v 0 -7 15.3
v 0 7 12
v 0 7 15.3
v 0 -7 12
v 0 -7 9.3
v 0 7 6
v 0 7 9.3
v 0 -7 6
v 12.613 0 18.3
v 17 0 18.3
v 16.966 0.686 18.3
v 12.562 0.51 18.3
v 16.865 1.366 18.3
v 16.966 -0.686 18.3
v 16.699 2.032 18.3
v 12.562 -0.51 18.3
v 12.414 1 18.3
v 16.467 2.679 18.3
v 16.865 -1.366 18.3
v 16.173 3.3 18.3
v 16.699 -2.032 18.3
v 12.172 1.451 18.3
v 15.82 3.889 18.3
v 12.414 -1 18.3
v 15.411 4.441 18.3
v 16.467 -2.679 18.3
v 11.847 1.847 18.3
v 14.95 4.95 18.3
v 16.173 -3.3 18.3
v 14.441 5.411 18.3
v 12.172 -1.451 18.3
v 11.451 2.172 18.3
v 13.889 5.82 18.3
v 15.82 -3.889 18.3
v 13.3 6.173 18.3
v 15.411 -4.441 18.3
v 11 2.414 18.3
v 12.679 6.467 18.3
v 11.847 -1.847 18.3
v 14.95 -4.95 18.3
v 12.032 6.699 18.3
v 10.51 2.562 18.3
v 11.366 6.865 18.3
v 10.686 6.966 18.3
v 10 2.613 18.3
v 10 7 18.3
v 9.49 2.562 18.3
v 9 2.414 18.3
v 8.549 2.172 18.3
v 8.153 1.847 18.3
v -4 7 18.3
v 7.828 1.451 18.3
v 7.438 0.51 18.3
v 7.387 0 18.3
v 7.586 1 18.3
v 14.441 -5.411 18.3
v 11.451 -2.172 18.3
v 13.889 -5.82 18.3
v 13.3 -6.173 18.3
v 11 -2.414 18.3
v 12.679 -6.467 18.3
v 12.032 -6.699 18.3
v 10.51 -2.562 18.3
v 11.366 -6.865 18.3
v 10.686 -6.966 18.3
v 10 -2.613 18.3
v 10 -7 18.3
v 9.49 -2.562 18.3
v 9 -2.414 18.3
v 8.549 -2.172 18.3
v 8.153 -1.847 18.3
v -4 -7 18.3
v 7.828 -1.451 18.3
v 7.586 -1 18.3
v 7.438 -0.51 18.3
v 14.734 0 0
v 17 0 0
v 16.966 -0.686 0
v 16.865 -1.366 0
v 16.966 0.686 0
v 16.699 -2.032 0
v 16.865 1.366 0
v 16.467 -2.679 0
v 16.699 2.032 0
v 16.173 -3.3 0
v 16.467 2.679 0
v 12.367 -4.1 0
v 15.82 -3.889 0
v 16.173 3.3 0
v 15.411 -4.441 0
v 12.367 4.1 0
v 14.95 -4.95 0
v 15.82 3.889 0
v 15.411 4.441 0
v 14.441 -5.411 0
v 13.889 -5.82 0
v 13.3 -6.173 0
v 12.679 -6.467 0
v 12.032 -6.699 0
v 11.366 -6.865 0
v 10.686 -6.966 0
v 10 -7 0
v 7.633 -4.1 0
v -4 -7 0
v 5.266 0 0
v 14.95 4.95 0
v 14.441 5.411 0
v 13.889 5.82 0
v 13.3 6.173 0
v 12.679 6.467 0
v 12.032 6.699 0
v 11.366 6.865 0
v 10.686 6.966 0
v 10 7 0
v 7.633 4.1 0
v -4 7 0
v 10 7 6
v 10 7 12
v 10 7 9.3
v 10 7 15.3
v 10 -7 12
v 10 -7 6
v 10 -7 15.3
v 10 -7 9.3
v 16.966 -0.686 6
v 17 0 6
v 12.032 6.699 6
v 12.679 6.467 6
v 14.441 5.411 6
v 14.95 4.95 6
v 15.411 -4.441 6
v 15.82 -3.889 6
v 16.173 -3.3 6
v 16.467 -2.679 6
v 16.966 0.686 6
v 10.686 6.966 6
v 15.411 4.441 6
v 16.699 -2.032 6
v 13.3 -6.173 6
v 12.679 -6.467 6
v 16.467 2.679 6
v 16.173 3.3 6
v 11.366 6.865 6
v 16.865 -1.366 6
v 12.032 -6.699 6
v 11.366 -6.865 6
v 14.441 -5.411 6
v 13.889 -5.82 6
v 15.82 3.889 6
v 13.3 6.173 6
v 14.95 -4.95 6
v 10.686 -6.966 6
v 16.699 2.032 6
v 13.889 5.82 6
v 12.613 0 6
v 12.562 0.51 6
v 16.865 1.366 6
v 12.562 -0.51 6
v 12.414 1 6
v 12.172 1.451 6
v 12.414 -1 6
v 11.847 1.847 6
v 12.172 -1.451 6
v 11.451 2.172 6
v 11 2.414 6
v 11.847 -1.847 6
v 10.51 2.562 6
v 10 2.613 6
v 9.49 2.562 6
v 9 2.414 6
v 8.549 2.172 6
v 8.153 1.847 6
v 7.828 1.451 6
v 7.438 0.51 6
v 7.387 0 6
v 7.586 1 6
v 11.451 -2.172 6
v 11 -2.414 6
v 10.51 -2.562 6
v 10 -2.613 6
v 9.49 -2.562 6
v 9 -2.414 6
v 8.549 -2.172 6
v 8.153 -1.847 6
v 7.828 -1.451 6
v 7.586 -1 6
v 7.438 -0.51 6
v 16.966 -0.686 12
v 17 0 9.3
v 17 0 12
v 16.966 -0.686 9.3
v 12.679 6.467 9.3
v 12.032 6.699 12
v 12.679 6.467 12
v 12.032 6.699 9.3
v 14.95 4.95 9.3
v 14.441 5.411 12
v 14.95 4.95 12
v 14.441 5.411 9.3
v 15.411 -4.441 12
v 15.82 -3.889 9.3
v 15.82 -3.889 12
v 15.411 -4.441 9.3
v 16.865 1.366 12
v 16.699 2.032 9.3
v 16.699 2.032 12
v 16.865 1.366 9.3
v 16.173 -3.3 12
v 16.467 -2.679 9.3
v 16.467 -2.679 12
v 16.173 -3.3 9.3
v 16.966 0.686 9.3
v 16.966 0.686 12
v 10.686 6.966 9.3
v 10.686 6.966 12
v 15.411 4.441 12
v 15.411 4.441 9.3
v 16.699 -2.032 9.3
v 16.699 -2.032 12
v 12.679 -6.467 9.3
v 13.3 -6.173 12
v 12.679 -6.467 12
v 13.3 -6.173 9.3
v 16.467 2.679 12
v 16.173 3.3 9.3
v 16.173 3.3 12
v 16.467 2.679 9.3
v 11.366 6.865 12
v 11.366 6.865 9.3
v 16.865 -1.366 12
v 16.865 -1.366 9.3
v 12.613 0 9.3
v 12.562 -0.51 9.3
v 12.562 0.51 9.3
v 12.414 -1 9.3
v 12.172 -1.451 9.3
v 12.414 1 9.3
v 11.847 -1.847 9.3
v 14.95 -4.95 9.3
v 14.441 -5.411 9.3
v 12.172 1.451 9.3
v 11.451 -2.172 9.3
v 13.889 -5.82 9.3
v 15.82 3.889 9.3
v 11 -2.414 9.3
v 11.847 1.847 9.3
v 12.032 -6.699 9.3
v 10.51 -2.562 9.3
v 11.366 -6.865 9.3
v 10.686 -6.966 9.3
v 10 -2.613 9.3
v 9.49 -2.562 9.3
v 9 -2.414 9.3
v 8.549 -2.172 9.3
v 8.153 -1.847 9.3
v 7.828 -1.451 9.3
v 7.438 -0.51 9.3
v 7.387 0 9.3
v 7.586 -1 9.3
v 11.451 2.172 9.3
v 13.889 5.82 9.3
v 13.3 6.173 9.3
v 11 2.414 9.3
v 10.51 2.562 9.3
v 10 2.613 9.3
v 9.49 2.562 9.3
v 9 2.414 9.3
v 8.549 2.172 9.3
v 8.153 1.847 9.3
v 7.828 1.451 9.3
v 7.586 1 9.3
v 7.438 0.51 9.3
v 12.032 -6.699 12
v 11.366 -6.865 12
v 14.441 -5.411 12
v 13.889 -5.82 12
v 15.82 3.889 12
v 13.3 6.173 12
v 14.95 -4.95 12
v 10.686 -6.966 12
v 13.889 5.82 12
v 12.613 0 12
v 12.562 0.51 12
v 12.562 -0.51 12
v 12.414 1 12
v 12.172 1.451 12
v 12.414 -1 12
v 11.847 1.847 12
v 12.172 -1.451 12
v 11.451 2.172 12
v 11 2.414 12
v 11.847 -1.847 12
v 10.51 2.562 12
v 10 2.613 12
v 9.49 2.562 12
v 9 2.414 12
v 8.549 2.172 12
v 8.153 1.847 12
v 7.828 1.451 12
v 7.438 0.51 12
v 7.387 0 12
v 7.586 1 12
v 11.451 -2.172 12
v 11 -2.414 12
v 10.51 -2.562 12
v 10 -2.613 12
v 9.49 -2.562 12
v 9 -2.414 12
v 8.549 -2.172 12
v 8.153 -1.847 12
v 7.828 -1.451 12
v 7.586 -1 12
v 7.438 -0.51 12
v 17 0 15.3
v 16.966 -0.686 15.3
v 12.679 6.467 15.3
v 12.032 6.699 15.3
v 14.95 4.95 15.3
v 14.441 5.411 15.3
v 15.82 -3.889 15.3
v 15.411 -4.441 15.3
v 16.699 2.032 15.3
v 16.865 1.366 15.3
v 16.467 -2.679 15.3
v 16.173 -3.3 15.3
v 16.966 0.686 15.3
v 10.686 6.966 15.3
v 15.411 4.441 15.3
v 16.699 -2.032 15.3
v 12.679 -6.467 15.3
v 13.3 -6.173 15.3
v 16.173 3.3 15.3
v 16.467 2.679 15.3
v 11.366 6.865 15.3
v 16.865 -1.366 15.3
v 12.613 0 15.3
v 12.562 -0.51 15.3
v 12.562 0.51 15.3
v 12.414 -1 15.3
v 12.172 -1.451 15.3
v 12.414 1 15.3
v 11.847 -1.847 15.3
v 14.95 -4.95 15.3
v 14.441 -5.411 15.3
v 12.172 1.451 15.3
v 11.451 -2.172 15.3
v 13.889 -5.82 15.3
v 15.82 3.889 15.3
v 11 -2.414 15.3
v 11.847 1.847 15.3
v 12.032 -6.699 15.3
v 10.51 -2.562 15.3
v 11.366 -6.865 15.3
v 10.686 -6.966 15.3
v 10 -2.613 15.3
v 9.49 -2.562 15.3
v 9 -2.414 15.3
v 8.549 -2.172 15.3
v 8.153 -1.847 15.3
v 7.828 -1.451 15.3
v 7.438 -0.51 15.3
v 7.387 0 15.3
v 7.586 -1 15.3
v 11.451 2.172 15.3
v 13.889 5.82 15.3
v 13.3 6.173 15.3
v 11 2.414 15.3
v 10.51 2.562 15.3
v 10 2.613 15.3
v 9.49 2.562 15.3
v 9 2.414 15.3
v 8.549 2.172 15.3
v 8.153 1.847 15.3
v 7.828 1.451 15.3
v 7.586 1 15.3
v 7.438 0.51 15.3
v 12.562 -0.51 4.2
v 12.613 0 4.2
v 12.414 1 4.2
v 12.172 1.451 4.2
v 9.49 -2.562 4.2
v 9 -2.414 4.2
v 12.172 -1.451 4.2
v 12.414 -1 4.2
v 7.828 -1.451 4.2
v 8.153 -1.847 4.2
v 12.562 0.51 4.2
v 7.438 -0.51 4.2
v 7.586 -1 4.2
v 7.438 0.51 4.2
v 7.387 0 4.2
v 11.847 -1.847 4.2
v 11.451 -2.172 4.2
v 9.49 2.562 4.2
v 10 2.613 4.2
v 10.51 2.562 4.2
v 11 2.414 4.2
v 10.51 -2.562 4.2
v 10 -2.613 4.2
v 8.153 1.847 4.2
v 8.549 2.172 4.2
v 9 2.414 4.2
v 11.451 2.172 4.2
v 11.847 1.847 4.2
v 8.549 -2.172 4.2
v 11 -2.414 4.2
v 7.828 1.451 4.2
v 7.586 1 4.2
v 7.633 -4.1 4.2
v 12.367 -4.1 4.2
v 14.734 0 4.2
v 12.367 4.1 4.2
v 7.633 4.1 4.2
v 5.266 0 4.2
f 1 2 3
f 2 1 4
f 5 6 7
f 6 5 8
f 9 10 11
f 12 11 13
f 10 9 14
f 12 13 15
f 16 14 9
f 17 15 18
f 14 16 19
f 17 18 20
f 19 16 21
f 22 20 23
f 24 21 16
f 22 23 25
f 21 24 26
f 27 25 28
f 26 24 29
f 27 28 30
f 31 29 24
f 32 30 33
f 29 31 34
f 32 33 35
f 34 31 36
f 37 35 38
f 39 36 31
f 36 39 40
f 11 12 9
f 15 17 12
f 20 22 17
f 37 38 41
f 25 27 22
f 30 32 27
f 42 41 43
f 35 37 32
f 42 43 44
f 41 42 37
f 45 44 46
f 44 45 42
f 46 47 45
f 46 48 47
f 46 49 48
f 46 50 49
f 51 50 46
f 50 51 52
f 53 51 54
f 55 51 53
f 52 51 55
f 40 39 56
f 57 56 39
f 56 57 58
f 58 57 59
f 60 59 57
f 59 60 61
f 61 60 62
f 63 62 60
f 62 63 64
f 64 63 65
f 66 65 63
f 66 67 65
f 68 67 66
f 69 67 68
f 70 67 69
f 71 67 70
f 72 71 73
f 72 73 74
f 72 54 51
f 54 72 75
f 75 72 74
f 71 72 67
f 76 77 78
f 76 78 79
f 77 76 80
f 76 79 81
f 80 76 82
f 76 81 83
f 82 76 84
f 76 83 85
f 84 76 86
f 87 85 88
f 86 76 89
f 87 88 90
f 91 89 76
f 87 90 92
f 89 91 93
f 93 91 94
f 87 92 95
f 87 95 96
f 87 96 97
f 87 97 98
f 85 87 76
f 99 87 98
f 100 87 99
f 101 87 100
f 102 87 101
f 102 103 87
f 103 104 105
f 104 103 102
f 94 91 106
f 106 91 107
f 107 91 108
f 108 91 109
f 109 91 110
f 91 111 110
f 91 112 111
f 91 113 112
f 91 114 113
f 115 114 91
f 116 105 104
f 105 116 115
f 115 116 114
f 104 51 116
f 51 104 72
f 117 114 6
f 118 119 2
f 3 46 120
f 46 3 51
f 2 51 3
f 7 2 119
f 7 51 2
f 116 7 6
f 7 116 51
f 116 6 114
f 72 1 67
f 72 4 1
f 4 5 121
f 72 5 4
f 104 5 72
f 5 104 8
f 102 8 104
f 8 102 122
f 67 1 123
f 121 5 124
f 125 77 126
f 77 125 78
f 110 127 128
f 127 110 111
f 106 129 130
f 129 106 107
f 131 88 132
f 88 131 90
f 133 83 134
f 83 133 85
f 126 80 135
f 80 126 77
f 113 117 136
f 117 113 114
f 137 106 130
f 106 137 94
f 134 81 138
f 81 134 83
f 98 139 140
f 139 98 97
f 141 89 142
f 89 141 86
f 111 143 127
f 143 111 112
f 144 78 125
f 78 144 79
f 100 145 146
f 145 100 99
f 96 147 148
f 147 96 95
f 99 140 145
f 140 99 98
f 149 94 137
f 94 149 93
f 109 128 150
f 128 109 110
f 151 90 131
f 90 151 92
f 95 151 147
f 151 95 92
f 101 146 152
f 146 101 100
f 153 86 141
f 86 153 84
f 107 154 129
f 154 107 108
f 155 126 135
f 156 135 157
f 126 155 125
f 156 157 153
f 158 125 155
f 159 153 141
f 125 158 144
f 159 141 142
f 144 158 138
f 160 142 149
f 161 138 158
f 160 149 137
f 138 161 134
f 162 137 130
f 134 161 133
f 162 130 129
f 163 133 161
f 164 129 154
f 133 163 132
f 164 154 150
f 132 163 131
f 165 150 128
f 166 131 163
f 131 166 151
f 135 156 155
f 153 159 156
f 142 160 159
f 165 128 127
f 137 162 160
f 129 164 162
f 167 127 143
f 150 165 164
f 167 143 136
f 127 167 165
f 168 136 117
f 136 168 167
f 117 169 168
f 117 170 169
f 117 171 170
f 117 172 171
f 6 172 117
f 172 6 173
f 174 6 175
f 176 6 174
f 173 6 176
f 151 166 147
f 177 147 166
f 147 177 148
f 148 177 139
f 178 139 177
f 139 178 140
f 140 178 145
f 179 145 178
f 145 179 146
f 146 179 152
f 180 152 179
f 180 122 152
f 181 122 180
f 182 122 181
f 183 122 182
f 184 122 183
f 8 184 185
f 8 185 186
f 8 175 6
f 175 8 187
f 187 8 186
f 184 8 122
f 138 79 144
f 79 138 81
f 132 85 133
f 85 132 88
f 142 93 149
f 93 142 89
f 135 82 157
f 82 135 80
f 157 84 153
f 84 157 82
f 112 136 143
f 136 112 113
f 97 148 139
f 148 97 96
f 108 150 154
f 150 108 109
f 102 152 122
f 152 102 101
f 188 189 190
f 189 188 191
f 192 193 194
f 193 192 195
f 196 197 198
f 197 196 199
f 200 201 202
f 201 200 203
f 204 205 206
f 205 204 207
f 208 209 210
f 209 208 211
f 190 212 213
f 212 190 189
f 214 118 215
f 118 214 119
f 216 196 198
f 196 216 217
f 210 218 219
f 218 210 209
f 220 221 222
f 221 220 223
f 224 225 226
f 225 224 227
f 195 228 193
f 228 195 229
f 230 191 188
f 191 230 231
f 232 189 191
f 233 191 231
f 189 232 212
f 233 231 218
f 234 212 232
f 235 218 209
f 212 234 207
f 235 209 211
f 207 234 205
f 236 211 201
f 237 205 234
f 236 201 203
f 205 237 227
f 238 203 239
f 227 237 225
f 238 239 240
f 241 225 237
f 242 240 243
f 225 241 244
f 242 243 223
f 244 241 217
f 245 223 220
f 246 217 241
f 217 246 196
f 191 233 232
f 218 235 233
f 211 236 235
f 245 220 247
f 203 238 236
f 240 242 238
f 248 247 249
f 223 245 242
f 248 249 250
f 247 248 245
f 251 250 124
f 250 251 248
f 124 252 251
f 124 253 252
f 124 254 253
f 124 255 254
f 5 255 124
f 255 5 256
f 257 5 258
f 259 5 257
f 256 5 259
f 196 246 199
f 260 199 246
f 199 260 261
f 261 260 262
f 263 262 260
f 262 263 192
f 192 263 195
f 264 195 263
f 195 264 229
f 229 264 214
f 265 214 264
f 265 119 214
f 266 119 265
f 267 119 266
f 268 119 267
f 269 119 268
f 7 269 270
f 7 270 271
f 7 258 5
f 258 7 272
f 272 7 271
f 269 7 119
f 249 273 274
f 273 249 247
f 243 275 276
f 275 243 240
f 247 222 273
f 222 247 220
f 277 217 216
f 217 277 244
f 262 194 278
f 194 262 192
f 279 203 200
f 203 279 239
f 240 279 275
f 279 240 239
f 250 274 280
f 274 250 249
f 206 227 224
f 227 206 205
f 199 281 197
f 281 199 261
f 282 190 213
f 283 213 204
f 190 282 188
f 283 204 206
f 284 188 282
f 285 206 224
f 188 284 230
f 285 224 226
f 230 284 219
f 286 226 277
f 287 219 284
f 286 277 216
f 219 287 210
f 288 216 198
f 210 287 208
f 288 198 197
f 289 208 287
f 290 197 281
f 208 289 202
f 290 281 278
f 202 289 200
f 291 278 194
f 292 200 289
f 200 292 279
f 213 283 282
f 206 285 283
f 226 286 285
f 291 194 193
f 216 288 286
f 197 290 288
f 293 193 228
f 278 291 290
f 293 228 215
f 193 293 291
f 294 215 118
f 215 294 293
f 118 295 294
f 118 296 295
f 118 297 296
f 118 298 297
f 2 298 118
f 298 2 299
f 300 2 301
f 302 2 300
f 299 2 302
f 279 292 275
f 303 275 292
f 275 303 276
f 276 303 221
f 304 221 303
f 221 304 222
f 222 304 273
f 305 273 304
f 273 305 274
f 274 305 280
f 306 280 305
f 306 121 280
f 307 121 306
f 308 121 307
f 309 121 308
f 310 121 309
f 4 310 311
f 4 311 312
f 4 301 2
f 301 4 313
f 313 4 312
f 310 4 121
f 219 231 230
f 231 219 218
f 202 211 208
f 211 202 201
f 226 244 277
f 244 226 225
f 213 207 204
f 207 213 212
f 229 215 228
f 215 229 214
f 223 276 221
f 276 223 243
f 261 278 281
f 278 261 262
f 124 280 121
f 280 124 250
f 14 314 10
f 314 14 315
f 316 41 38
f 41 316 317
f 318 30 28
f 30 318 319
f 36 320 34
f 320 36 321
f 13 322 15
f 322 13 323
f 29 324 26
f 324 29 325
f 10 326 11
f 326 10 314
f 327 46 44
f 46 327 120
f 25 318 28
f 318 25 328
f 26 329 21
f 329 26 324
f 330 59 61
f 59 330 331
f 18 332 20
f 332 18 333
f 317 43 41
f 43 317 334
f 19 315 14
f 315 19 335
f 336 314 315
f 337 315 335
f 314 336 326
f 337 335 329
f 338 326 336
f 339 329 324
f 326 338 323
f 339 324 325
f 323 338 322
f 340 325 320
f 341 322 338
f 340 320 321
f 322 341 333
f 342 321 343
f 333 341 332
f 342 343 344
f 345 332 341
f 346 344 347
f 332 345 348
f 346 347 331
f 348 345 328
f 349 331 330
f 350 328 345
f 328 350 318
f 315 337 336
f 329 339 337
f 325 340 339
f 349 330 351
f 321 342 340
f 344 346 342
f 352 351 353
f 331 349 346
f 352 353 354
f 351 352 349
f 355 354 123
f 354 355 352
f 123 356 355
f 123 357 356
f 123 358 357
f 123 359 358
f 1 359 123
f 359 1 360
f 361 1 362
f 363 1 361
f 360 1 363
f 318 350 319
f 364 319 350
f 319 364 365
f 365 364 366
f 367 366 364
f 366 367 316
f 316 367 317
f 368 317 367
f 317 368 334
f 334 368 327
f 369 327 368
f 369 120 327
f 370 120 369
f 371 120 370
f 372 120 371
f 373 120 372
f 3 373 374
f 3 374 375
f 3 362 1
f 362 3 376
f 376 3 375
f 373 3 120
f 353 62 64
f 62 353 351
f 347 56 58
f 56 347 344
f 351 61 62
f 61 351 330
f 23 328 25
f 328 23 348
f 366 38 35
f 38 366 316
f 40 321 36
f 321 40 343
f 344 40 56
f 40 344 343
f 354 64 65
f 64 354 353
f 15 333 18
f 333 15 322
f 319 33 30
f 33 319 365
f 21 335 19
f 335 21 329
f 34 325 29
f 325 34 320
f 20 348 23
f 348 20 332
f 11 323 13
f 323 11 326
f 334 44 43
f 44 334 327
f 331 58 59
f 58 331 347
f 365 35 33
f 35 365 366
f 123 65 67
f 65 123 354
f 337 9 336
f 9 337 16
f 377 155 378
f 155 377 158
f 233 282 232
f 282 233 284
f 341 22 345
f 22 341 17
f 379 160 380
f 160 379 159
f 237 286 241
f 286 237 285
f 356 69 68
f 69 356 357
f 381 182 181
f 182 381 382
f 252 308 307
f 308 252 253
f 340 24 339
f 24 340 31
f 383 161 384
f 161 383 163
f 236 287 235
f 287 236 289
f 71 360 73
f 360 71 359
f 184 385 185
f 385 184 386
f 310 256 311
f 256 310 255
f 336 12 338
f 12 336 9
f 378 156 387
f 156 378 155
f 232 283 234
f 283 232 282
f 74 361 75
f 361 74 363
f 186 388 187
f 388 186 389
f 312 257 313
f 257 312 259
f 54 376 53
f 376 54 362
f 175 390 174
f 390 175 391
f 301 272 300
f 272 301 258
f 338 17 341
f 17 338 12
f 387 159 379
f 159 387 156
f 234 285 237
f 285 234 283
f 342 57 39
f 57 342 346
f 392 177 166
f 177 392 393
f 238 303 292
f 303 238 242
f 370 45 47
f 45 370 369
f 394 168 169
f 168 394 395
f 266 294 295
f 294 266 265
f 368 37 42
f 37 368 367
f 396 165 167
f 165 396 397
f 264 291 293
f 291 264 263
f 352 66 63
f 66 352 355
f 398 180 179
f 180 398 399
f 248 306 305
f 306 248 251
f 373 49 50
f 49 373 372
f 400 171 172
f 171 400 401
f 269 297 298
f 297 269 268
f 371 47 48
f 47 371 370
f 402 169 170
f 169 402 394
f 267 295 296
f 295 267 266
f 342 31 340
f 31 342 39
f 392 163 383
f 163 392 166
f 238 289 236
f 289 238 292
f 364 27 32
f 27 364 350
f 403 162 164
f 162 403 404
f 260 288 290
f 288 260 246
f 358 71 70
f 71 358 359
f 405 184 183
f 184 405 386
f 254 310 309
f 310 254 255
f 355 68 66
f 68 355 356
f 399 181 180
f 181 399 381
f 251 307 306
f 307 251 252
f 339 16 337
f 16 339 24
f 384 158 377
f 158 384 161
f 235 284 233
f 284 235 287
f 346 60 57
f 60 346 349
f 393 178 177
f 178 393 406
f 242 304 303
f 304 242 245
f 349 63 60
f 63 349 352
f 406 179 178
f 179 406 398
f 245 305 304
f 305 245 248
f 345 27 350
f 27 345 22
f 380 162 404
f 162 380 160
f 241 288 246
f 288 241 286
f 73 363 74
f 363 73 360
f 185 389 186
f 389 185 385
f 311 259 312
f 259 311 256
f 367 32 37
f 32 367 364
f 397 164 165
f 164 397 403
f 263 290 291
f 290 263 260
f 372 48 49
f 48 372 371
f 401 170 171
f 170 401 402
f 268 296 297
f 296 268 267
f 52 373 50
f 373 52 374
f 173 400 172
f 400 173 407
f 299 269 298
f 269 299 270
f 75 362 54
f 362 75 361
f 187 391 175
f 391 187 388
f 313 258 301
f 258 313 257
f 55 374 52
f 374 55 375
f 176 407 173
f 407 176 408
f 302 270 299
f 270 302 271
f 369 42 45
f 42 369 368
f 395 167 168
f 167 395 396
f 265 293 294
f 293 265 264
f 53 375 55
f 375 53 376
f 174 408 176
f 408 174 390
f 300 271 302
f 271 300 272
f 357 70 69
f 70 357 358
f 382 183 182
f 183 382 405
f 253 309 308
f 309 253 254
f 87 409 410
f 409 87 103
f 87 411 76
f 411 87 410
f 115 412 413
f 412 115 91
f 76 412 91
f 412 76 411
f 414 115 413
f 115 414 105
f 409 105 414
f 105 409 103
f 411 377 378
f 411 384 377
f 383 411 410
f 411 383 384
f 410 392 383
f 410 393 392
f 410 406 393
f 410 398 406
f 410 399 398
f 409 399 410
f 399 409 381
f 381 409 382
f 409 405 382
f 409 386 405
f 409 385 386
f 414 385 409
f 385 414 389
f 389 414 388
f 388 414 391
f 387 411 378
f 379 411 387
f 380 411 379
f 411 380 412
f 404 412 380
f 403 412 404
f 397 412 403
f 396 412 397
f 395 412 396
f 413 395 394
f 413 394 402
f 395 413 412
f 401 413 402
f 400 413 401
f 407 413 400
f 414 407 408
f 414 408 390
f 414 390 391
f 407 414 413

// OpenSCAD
// DJI genuine Action 6 waterproof case: FIT COUPON ONLY, not a load-bearing mount.
// User measured 2026-09-09: tabs 3, gap 3, bore 5, body bottom to axis 12.5 mm.
/* [Measured case] */
tab_t = 3;
tab_gap = 3;
case_bore = 5;
body_to_axis = 12.5;
/* [Print fit] */
gap_allowance = 0.3;
center_allowance = 0.3;
bore_allowance = 0.2;
/* [Receiver] */
lower_t = 6;
upper_t = 3;
lug_r = 7;
axis_x = 10;
back_t = 4;
// Assumed ordinary M5 nut; verify actual thread pitch and nut before use.
nut_af = 8.2;
nut_depth = 4.2;
/* [Hidden] */
$fn = 64;
eps = 0.02;
middle_t = tab_gap-center_allowance;
slot = tab_t+gap_allowance;
middle_z = lower_t+slot;
upper_z = middle_z+middle_t+slot;
height = upper_z+upper_t;
hole_d = case_bore+bore_allowance;
assert(middle_t > 0 && nut_depth < lower_t-1);
assert(body_to_axis > lug_r);
echo(total_stack=height, nut_entry_from_head=height-nut_depth,
     nominal_body_plane_x=axis_x+body_to_axis);
module lug(z,t) {
    translate([0,0,z]) linear_extrude(t) hull() {
        translate([-back_t,-lug_r]) square([back_t,2*lug_r]);
        translate([axis_x,0]) circle(r=lug_r);
    }
}
difference() {
    union() {
        translate([-back_t,-lug_r,0]) cube([back_t,2*lug_r,height]);
        lug(0,lower_t);
        lug(middle_z,middle_t);
        lug(upper_z,upper_t);
    }
    translate([axis_x,0,-eps])
        cylinder(d=hole_d/cos(180/32),h=height+2*eps,$fn=32);
    translate([axis_x,0,-eps])
        cylinder(d=nut_af/cos(30),h=nut_depth+eps,$fn=6);
}
